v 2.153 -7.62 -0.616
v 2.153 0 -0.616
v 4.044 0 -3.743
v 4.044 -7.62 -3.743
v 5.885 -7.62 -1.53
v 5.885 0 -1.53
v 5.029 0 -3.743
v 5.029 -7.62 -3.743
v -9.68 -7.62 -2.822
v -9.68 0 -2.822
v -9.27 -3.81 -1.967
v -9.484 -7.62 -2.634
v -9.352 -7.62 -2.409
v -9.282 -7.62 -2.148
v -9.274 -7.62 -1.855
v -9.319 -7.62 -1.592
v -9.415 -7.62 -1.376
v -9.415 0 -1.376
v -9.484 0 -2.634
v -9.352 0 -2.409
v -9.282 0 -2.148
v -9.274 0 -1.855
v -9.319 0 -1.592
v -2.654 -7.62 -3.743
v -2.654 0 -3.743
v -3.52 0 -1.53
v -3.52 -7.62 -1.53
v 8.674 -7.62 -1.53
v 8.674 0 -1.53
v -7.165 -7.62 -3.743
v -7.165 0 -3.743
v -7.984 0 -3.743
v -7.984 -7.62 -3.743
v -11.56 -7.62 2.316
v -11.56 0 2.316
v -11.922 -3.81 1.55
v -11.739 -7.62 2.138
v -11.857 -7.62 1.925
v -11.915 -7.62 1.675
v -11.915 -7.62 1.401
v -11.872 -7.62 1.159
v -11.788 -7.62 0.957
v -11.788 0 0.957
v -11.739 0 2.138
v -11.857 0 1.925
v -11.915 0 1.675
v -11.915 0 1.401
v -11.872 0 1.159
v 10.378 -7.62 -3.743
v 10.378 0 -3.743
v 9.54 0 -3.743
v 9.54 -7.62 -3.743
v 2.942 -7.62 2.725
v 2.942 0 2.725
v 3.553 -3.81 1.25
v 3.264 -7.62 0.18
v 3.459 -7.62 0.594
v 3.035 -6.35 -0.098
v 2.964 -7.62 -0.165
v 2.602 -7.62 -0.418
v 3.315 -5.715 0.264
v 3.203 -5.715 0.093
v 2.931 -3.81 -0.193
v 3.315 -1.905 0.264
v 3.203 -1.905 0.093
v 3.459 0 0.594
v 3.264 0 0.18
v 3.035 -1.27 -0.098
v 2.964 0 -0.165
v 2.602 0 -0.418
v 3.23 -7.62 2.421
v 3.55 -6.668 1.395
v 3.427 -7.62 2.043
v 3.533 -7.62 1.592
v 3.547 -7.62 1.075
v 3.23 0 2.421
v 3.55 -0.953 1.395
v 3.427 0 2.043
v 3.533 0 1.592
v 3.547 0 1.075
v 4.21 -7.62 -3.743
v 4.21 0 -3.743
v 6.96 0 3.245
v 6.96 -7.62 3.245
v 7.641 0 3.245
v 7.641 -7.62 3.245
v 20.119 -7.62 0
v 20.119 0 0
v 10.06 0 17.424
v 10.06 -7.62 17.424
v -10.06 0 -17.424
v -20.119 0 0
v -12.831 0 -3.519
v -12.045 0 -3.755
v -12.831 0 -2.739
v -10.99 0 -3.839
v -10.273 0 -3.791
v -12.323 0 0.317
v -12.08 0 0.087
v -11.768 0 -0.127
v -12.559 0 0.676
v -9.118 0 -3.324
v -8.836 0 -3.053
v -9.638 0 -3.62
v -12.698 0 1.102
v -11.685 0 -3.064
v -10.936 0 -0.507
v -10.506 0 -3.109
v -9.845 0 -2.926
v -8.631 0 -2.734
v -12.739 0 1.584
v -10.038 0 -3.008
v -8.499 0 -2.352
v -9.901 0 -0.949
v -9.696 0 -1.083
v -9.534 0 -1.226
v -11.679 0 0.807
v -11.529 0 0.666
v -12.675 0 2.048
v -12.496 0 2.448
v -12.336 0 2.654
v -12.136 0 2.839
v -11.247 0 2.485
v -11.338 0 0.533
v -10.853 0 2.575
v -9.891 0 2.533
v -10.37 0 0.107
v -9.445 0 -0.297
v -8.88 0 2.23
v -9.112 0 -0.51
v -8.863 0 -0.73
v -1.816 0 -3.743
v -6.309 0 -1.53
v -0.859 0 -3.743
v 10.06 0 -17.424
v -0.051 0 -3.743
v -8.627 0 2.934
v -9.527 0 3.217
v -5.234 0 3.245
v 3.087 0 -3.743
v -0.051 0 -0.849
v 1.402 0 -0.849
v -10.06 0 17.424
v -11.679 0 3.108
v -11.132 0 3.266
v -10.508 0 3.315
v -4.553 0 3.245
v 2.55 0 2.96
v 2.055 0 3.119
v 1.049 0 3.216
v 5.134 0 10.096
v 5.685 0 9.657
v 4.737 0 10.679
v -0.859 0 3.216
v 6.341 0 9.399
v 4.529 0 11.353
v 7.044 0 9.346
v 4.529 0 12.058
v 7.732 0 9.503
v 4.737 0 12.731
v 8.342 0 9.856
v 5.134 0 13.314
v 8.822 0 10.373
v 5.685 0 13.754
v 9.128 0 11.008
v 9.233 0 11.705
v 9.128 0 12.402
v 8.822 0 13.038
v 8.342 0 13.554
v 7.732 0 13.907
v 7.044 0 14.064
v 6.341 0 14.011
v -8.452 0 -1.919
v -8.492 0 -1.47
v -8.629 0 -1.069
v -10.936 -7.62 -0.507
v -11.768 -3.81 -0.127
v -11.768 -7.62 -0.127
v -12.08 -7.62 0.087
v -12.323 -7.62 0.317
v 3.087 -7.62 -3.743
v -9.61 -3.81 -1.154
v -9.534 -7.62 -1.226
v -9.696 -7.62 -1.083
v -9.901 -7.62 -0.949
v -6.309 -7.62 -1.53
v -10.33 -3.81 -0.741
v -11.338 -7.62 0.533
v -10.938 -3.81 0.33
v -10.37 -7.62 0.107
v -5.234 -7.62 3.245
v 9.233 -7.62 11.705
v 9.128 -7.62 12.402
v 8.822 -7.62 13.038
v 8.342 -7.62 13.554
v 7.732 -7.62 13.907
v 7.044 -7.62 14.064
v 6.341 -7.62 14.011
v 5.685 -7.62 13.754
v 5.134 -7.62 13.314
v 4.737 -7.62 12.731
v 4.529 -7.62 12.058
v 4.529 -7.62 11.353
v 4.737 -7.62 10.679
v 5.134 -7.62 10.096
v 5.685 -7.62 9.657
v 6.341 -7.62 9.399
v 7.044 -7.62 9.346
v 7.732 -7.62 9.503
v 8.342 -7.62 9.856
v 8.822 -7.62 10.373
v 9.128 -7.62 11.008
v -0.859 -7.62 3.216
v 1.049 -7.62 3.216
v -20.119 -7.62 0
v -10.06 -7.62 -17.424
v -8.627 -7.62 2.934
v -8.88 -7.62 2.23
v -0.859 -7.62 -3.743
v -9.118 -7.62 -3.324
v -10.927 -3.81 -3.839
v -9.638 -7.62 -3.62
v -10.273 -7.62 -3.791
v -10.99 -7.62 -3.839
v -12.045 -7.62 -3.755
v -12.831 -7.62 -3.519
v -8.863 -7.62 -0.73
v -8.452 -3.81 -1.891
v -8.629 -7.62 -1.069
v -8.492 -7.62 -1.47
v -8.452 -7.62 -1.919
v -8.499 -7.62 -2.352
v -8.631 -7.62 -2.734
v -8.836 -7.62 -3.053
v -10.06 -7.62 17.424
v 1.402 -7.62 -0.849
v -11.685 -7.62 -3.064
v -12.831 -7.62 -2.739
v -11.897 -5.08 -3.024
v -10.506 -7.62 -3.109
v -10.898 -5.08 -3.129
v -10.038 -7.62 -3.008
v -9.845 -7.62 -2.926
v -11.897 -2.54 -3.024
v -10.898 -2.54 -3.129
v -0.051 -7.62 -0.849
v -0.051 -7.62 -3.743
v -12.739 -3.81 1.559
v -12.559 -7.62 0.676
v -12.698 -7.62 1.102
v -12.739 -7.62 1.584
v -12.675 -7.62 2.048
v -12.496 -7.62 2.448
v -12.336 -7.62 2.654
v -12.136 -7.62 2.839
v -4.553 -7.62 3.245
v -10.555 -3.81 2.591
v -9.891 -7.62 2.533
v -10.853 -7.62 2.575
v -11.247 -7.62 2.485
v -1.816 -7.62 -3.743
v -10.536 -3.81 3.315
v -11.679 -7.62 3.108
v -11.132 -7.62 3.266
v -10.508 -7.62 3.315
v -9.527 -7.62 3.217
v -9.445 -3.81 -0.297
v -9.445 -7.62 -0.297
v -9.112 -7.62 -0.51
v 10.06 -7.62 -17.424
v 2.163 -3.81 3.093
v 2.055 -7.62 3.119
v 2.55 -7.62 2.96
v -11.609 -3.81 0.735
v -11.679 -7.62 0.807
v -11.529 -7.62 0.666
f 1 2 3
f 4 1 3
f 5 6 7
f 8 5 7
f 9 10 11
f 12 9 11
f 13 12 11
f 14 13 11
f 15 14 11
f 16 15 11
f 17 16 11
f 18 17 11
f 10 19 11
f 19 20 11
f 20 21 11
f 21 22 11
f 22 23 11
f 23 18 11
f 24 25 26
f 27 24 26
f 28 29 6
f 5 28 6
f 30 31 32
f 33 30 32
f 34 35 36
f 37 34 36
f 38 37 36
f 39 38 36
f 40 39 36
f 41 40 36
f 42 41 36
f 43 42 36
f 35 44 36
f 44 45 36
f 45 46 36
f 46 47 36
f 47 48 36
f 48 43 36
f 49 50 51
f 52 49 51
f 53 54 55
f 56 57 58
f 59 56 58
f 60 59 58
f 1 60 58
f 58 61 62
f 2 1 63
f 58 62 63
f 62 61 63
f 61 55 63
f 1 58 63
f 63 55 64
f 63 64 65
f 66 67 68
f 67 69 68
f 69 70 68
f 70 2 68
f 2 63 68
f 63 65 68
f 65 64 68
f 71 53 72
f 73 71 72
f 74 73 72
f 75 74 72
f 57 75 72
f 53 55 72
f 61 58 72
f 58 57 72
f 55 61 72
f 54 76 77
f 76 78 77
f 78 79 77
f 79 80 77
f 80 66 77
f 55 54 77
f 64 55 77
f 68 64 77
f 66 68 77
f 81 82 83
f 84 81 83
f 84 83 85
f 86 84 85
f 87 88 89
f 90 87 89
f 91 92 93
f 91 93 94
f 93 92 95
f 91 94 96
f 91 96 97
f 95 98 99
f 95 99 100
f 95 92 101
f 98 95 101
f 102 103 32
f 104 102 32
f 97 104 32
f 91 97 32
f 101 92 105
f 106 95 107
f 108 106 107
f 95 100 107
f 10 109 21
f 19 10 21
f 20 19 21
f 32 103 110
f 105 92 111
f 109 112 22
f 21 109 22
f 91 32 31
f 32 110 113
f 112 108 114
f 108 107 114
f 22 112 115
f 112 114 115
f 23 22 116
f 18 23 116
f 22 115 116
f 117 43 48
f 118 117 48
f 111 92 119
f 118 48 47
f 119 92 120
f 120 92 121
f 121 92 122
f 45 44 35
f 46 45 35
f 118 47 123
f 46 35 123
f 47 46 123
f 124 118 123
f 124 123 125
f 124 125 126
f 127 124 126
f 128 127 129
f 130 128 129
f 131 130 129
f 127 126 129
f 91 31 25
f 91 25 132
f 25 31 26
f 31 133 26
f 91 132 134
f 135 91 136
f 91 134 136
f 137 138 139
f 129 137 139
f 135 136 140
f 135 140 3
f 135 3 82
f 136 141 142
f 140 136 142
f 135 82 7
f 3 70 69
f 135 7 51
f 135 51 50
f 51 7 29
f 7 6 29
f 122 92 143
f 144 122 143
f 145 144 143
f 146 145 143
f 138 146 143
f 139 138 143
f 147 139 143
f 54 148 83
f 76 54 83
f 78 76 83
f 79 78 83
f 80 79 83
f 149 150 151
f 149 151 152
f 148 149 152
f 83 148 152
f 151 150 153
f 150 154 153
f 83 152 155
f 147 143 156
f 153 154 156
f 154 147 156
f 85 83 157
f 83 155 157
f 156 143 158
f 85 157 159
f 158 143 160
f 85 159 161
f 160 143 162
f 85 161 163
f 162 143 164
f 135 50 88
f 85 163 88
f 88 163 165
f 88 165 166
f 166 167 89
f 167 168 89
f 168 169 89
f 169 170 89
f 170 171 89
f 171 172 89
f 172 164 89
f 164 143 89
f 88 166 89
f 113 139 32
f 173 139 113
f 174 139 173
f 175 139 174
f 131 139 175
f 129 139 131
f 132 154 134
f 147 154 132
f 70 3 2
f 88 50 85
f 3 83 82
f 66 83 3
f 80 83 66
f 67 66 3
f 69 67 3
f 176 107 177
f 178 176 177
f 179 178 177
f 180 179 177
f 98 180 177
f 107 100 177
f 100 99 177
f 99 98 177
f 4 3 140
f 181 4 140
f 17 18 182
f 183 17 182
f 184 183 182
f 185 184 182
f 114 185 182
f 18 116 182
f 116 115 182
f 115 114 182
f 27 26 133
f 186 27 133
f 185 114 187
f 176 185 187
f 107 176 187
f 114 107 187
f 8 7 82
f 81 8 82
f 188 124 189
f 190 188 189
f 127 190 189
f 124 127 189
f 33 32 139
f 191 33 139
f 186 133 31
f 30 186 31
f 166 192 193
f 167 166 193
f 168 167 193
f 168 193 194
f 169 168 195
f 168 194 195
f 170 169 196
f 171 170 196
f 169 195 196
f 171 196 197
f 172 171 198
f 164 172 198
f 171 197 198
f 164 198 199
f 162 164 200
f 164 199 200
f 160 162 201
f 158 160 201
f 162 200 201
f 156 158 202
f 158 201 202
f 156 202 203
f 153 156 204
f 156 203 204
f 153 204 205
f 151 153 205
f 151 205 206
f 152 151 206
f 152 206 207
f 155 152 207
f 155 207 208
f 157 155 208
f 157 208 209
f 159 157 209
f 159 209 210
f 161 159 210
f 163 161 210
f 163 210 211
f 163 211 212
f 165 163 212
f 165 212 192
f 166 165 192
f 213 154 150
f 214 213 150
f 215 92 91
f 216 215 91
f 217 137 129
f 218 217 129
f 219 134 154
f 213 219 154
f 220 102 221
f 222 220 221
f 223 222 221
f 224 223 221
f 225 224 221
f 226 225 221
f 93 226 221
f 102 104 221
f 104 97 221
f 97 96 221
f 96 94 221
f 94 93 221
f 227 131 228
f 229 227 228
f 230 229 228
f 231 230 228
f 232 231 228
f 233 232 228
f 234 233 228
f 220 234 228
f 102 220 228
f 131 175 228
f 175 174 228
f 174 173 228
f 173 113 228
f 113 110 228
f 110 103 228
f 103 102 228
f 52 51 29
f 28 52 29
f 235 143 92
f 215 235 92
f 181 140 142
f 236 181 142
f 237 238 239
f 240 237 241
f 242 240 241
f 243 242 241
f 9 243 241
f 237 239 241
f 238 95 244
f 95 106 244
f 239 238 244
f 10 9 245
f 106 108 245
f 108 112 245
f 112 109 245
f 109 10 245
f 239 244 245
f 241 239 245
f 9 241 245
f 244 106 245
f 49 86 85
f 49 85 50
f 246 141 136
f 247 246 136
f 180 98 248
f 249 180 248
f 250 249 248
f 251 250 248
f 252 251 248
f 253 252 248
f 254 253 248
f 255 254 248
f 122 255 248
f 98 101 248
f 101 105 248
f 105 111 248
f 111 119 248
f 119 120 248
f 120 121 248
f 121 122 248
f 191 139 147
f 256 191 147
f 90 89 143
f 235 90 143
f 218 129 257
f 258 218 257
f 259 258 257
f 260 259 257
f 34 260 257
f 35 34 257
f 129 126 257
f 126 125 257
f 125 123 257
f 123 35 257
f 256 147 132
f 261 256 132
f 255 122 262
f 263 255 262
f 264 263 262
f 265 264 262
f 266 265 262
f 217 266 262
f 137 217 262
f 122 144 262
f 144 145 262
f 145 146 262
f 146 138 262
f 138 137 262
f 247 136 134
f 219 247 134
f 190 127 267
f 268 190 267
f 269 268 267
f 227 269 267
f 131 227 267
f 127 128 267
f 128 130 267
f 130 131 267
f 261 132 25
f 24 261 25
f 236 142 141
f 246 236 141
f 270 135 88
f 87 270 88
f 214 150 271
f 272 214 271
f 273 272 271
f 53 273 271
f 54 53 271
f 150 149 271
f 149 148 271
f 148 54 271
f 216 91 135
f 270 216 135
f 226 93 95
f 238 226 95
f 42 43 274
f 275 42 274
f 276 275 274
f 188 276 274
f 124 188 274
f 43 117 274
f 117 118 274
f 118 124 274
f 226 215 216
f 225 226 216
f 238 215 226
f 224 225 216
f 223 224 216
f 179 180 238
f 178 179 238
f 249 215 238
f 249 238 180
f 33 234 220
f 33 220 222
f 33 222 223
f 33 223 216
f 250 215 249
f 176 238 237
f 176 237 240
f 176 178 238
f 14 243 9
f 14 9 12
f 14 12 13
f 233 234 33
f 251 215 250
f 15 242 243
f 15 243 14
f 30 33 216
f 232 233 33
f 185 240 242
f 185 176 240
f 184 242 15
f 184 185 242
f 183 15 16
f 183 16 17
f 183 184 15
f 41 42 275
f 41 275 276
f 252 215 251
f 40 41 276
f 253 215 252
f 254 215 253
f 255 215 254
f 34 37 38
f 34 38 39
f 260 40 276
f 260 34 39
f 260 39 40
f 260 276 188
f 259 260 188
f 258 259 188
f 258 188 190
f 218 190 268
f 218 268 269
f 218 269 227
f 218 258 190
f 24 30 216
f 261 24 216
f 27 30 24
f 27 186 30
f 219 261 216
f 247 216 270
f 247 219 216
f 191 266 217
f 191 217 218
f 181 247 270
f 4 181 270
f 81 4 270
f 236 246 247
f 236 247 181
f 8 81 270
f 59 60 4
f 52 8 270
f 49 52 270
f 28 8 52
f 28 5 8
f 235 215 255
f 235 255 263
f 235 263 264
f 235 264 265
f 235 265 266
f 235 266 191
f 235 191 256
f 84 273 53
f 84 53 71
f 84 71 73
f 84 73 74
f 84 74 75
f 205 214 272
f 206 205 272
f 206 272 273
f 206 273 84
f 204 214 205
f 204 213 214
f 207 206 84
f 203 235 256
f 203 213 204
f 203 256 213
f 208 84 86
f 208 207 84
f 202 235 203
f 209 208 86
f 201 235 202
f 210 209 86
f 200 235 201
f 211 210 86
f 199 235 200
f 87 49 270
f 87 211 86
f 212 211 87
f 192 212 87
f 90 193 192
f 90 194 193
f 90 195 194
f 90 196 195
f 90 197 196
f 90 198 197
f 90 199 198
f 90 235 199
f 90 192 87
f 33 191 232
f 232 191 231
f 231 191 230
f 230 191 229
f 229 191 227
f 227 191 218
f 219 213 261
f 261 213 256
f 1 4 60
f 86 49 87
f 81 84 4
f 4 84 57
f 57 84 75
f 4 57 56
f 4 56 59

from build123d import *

# Parameters (mm, degrees)
F1_DEPTH = 7.62
F2_R     = 2.365375
F3_DEPTH = 25.4


with BuildPart() as f1:
    # F0 (on Front) → F1 (new body)
    with BuildSketch(Plane.XZ):
        Polygon((10.0597376004, 17.4239766347), (-10.0597376004, 17.4239766347), (-20.1194752008, 0), (-10.0597376004, -17.4239766347), (10.0597376004, -17.4239766347), (20.1194752008, 0), align=None)
        with BuildLine():
            add(Edge.make_bspline(
                [(-8.8631942381, -0.7304763376), (-8.451958628, -1.1782662241), (-8.451958628, -1.8910746148)],
                knots=[0, 0, 0, 1, 1, 1], degree=2))
            add(Edge.make_bspline(
                [(-8.451958628, -1.8910746148), (-8.451958628, -2.8095008106), (-9.1183126258, -3.3243068706)],
                knots=[0, 0, 0, 1, 1, 1], degree=2))
            add(Edge.make_bspline(
                [(-9.1183126258, -3.3243068706), (-9.7846666235, -3.8391129306), (-10.9269877626, -3.8391129306)],
                knots=[0, 0, 0, 1, 1, 1], degree=2))
            add(Edge.make_bspline(
                [(-10.9269877626, -3.8391129306), (-12.1637407824, -3.8391129306), (-12.8308563276, -3.5192630116)],
                knots=[0, 0, 0, 1, 1, 1], degree=2))
            Line((-12.8308563276, -3.5192630116), (-12.8308563276, -2.7394384474))
            add(Edge.make_bspline(
                [(-12.8308563276, -2.7394384474), (-12.4013435793, -2.9191636399), (-11.8971991833, -3.0242571847)],
                knots=[0, 0, 0, 1, 1, 1], degree=2))
            add(Edge.make_bspline(
                [(-11.8971991833, -3.0242571847), (-11.3930547873, -3.1293507295), (-10.8980489604, -3.1293507295)],
                knots=[0, 0, 0, 1, 1, 1], degree=2))
            add(Edge.make_bspline(
                [(-10.8980489604, -3.1293507295), (-10.0892855939, -3.1293507295), (-9.6795730788, -2.8224471168)],
                knots=[0, 0, 0, 1, 1, 1], degree=2))
            add(Edge.make_bspline(
                [(-9.6795730788, -2.8224471168), (-9.2698605636, -2.5155435042), (-9.2698605636, -1.9672293574)],
                knots=[0, 0, 0, 1, 1, 1], degree=2))
            add(Edge.make_bspline(
                [(-9.2698605636, -1.9672293574), (-9.2698605636, -1.6062558775), (-9.4153161219, -1.3755070074)],
                knots=[0, 0, 0, 1, 1, 1], degree=2))
            add(Edge.make_bspline(
                [(-9.4153161219, -1.3755070074), (-9.5607716803, -1.1447581373), (-9.9011833797, -0.9490404489)],
                knots=[0, 0, 0, 1, 1, 1], degree=2))
            add(Edge.make_bspline(
                [(-9.9011833797, -0.9490404489), (-10.2415950792, -0.7533227604), (-10.9361263317, -0.5065813943)],
                knots=[0, 0, 0, 1, 1, 1], degree=2))
            add(Edge.make_bspline(
                [(-10.9361263317, -0.5065813943), (-11.9063377524, -0.1593157681), (-12.3229041944, 0.3166513732)],
                knots=[0, 0, 0, 1, 1, 1], degree=2))
            add(Edge.make_bspline(
                [(-12.3229041944, 0.3166513732), (-12.7394706365, 0.7926185144), (-12.7394706365, 1.558735225)],
                knots=[0, 0, 0, 1, 1, 1], degree=2))
            add(Edge.make_bspline(
                [(-12.7394706365, 1.558735225), (-12.7394706365, 2.3629293069), (-12.1355635276, 2.8388964481)],
                knots=[0, 0, 0, 1, 1, 1], degree=2))
            add(Edge.make_bspline(
                [(-12.1355635276, 2.8388964481), (-11.5316564188, 3.3148635894), (-10.5355523856, 3.3148635894)],
                knots=[0, 0, 0, 1, 1, 1], degree=2))
            add(Edge.make_bspline(
                [(-10.5355523856, 3.3148635894), (-9.4983247914, 3.3148635894), (-8.627114536, 2.9340898764)],
                knots=[0, 0, 0, 1, 1, 1], degree=2))
            Line((-8.627114536, 2.9340898764), (-8.8799482814, 2.2304200547))
            add(Edge.make_bspline(
                [(-8.8799482814, 2.2304200547), (-9.7420199677, 2.5913935347), (-10.5553526187, 2.5913935347)],
                knots=[0, 0, 0, 1, 1, 1], degree=2))
            add(Edge.make_bspline(
                [(-10.5553526187, 2.5913935347), (-11.1980986462, 2.5913935347), (-11.5598336736, 2.3157133664)],
                knots=[0, 0, 0, 1, 1, 1], degree=2))
            add(Edge.make_bspline(
                [(-11.5598336736, 2.3157133664), (-11.9215687009, 2.0400331982), (-11.9215687009, 1.5495966559)],
                knots=[0, 0, 0, 1, 1, 1], degree=2))
            add(Edge.make_bspline(
                [(-11.9215687009, 1.5495966559), (-11.9215687009, 1.1886231759), (-11.7882979014, 0.9571127584)],
                knots=[0, 0, 0, 1, 1, 1], degree=2))
            add(Edge.make_bspline(
                [(-11.7882979014, 0.9571127584), (-11.6550271018, 0.7256023409), (-11.3382233726, 0.5329308422)],
                knots=[0, 0, 0, 1, 1, 1], degree=2))
            add(Edge.make_bspline(
                [(-11.3382233726, 0.5329308422), (-11.0214196434, 0.3402593434), (-10.3695350467, 0.107225831)],
                knots=[0, 0, 0, 1, 1, 1], degree=2))
            add(Edge.make_bspline(
                [(-10.3695350467, 0.107225831), (-9.2744298481, -0.2826864511), (-8.8631942381, -0.7304763376)],
                knots=[0, 0, 0, 1, 1, 1], degree=2))
        make_face(mode=Mode.SUBTRACT)
        Polygon((-1.8158343578, -3.7431579549), (-2.6535365264, -3.7431579549), (-3.5201774972, -1.5301011349), (-6.3089641712, -1.5301011349), (-7.1649434781, -3.7431579549), (-7.9843685085, -3.7431579549), (-5.2336592057, 3.2448012262), (-4.5528358069, 3.2448012262), align=None, mode=Mode.SUBTRACT)
        with BuildLine():
            Line((1.4024650645, -0.8492777361), (-0.0505674243, -0.8492777361))
            Line((-0.0505674243, -0.8492777361), (-0.0505674243, -3.7431579549))
            Line((-0.0505674243, -3.7431579549), (-0.8593307907, -3.7431579549))
            Line((-0.8593307907, -3.7431579549), (-0.8593307907, 3.215862424))
            Line((-0.8593307907, 3.215862424), (1.0491070589, 3.215862424))
            add(Edge.make_bspline(
                [(1.0491070589, 3.215862424), (2.3300298294, 3.215862424), (2.9415524125, 2.7254258816)],
                knots=[0, 0, 0, 1, 1, 1], degree=2))
            add(Edge.make_bspline(
                [(2.9415524125, 2.7254258816), (3.5530749956, 2.2349893393), (3.5530749956, 1.24954697)],
                knots=[0, 0, 0, 1, 1, 1], degree=2))
            add(Edge.make_bspline(
                [(3.5530749956, 1.24954697), (3.5530749956, -0.1303769659), (2.1533508266, -0.6162442237)],
                knots=[0, 0, 0, 1, 1, 1], degree=2))
            Line((2.1533508266, -0.6162442237), (4.0435115379, -3.7431579549))
            Line((4.0435115379, -3.7431579549), (3.0870079709, -3.7431579549))
            Line((3.0870079709, -3.7431579549), (1.4024650645, -0.8492777361))
        make_face(mode=Mode.SUBTRACT)
        Polygon((10.3780630275, -3.7431579549), (9.5403608589, -3.7431579549), (8.6737198881, -1.5301011349), (5.884933214, -1.5301011349), (5.0289539072, -3.7431579549), (4.2095288768, -3.7431579549), (6.9602381795, 3.2448012262), (7.6410615784, 3.2448012262), align=None, mode=Mode.SUBTRACT)
    extrude(amount=F1_DEPTH)

    # F2 (on face) → F3 (cut)
    with BuildSketch(Plane.XZ.offset(7.62)):
        with Locations((6.8676967915, 11.7051630221)):
            Circle(F2_R)
    extrude(amount=-F3_DEPTH, mode=Mode.SUBTRACT)


solid = f1.part
